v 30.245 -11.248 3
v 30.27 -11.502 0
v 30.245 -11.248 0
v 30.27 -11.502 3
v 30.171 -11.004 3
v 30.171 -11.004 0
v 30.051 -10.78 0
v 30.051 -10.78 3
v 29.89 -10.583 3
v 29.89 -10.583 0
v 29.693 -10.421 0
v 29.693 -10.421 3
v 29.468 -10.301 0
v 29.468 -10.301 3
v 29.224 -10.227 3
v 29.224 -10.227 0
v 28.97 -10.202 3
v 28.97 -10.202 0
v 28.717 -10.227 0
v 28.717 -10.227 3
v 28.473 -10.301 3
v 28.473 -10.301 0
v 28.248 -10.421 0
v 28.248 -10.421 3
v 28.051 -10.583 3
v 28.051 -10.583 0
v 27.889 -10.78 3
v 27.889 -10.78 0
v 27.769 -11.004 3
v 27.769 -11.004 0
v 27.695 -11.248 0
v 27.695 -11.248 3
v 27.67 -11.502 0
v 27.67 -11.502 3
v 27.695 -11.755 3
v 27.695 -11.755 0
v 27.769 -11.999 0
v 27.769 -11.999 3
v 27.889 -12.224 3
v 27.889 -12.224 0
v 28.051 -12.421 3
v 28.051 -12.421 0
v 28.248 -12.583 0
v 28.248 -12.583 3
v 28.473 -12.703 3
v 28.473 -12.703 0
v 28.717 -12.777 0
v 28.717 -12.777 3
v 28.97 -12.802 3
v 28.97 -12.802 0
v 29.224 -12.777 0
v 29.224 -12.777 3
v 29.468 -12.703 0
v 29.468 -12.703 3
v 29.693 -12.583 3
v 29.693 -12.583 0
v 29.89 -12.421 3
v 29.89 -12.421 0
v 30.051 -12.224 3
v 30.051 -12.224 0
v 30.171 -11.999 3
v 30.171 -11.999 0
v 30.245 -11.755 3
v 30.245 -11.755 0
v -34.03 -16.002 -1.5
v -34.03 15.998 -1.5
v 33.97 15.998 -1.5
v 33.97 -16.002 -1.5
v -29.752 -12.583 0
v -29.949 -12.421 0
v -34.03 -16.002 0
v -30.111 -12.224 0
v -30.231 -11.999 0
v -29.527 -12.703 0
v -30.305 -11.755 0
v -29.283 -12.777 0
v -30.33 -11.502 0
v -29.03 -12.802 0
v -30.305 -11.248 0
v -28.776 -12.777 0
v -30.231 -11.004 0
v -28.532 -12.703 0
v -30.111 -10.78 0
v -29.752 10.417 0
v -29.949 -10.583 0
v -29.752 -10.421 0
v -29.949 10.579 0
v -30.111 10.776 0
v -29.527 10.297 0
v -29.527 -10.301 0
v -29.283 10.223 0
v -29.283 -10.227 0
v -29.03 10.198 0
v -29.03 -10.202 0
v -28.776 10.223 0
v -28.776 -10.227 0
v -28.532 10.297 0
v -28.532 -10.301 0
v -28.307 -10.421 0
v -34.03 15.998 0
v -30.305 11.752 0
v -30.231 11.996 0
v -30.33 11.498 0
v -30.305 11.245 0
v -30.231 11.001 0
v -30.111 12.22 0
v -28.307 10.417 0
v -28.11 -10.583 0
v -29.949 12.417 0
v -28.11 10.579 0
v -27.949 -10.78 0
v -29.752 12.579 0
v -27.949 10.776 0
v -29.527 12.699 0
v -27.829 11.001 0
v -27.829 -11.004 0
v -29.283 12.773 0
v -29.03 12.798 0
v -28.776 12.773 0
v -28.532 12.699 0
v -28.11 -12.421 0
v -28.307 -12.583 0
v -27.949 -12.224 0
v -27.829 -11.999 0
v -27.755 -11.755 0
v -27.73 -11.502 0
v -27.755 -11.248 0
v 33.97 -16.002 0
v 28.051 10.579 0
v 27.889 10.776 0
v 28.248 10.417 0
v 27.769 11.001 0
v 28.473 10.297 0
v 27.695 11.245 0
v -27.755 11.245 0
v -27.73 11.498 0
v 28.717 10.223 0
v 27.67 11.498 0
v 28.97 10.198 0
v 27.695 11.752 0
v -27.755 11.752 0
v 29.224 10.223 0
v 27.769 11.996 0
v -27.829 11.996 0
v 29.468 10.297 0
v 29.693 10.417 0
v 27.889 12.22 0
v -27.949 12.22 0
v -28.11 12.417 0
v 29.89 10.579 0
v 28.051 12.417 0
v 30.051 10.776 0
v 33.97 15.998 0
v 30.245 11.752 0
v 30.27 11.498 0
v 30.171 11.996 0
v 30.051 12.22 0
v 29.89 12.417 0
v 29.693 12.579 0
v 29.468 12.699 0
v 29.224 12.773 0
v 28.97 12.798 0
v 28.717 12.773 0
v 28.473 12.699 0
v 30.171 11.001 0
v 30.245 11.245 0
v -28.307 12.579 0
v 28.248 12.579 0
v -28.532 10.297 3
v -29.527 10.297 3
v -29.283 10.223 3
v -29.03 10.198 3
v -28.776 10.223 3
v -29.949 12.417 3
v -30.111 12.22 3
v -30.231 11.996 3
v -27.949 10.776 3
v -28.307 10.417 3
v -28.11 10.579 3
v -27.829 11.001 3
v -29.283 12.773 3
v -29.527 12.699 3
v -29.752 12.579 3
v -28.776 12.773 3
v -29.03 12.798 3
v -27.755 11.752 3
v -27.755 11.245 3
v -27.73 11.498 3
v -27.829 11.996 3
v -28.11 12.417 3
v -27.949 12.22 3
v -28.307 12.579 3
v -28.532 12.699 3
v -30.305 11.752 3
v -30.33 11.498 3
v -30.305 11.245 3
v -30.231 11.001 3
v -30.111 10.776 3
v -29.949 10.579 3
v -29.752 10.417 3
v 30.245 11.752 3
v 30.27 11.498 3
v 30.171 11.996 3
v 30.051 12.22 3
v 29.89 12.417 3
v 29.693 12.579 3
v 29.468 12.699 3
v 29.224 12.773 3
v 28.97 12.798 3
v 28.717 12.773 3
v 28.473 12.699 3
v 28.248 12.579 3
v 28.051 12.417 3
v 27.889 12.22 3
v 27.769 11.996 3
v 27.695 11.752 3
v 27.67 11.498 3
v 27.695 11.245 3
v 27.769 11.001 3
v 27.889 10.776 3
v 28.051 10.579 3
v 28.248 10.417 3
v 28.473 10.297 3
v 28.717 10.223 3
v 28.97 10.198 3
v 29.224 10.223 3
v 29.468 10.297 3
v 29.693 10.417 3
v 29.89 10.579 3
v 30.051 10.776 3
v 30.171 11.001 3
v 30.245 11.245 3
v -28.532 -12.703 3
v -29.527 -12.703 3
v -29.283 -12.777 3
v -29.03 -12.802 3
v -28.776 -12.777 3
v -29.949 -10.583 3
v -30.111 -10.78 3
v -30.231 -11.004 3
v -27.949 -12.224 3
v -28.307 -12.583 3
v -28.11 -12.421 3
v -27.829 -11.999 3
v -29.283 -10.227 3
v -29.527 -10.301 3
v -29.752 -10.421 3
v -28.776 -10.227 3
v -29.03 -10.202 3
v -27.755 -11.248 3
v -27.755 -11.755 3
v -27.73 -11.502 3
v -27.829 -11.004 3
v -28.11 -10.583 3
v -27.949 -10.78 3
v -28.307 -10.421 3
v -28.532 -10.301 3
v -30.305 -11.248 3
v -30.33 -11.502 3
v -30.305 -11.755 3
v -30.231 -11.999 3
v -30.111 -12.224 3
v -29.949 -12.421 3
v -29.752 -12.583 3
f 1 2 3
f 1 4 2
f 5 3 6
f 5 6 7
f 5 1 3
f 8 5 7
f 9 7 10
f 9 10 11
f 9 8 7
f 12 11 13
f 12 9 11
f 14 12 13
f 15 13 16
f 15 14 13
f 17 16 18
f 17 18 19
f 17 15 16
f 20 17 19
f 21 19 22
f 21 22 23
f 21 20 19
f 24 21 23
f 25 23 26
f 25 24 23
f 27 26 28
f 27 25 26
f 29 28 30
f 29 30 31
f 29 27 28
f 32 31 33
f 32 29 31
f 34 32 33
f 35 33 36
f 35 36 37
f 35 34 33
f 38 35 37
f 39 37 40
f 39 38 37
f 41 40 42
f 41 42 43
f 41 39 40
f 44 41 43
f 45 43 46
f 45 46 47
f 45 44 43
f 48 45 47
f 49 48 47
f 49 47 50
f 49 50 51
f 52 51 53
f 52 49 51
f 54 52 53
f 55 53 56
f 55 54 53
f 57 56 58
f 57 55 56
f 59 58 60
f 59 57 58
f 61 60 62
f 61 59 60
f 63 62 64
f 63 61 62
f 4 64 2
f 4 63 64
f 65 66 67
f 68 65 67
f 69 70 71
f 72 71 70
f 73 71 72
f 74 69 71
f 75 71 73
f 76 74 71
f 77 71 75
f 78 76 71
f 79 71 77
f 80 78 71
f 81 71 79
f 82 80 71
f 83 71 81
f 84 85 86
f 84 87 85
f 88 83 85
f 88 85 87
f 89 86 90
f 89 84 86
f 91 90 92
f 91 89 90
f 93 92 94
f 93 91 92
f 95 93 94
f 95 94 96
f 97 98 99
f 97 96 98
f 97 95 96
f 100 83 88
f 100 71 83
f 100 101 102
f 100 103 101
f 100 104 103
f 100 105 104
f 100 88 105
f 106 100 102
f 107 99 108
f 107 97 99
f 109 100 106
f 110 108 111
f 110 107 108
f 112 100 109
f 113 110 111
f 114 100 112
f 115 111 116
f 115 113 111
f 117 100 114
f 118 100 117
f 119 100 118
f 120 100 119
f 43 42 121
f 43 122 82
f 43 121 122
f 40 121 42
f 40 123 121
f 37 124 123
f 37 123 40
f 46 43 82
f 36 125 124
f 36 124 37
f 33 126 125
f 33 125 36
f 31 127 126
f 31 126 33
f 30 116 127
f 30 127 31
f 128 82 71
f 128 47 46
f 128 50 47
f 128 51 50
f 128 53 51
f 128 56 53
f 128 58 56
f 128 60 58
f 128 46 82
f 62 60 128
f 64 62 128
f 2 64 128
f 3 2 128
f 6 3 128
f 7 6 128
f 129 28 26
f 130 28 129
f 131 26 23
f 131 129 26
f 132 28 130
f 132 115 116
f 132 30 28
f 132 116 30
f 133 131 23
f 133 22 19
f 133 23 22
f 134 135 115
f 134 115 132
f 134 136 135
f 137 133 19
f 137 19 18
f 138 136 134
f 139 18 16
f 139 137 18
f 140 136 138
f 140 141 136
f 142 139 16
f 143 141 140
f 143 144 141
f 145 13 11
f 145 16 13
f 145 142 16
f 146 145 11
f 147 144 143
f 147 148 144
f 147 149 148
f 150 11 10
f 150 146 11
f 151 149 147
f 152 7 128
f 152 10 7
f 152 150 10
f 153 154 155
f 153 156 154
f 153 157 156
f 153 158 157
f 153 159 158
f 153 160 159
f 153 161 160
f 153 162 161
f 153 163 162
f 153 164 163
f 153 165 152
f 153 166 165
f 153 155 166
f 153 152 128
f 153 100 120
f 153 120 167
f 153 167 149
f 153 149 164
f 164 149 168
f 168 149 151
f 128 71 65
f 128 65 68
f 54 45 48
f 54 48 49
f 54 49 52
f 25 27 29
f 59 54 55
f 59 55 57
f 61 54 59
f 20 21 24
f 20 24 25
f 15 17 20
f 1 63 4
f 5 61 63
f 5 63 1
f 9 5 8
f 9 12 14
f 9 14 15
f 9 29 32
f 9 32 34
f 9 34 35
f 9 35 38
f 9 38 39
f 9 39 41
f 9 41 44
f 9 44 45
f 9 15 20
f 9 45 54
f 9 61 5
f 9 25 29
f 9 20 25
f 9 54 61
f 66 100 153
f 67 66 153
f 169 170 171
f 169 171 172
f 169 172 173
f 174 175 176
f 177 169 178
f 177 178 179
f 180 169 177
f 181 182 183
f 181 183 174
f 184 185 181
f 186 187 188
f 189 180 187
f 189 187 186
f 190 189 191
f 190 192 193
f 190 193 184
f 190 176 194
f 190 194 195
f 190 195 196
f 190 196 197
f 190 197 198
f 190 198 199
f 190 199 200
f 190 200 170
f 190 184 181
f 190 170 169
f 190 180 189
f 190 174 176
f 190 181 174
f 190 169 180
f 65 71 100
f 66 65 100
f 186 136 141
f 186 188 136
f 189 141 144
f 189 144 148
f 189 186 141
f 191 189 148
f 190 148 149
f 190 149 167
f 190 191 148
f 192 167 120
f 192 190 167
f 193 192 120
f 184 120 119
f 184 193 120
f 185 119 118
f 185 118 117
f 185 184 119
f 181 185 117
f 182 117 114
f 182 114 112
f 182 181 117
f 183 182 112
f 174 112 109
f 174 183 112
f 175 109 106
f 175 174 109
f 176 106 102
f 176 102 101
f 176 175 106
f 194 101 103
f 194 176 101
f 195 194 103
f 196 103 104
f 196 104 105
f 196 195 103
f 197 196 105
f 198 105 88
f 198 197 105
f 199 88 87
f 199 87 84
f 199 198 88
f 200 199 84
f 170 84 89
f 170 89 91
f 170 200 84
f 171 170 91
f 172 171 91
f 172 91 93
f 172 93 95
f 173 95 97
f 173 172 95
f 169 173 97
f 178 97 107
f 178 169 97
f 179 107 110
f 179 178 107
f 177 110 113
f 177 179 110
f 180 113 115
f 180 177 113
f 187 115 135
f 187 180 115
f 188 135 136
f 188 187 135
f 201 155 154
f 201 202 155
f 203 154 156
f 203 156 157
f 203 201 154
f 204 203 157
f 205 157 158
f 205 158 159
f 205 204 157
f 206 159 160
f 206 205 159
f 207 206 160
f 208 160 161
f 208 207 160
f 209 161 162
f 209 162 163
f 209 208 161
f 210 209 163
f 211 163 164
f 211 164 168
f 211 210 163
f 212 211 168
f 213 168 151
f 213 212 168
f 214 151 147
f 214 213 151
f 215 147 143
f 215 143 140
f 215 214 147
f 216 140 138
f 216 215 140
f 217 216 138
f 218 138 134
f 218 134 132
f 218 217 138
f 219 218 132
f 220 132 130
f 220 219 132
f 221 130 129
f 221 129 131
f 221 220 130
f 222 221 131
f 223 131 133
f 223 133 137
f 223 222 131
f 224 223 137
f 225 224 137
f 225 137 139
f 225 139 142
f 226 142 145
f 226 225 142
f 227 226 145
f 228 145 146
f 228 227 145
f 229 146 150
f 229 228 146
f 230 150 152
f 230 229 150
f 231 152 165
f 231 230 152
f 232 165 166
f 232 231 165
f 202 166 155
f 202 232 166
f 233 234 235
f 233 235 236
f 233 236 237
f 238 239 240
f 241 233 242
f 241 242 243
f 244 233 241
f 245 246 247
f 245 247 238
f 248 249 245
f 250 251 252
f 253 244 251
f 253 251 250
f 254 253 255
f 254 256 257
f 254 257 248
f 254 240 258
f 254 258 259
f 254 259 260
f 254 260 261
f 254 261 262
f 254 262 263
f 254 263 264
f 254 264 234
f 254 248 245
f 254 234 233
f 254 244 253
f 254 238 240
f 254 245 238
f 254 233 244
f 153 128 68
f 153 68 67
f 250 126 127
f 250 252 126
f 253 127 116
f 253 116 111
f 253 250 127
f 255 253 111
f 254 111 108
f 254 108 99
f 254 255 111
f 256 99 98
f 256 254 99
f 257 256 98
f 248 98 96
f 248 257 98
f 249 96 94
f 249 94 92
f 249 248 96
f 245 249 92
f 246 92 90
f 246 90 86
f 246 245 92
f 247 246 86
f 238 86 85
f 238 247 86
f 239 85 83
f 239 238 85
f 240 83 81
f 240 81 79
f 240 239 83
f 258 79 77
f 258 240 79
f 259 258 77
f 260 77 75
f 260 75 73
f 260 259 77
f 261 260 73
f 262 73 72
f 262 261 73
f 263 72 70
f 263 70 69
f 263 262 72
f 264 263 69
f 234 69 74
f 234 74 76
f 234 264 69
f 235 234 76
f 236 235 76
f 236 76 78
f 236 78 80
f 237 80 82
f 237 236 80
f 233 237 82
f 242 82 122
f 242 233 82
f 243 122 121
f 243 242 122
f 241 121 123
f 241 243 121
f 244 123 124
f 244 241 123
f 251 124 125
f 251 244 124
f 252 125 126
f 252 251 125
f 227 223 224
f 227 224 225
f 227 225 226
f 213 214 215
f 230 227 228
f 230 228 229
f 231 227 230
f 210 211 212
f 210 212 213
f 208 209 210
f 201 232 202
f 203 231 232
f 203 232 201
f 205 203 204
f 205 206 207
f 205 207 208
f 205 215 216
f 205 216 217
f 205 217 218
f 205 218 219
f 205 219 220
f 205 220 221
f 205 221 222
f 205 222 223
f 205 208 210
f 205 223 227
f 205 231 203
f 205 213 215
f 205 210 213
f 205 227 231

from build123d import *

# Parameters (mm, degrees)
F0_R          = 1.3
F1_DEPTH      = 3
F1_DEPTH_BACK = 1.5
F0_W          = 68
F0_H          = 32
F2_DEPTH      = 1.5


with BuildPart() as f1:
    # F0 (on Top) → F1 (new body, two sides)
    with BuildSketch(Plane.XY) as f1_sk:
        with Locations((-29.0296536804, -11.5017628863)):
            Circle(F0_R)
    extrude(amount=F1_DEPTH)
    extrude(f1_sk.sketch, amount=-F1_DEPTH_BACK)



with BuildPart() as f1b:
    # F0 (on Top) → F1, piece 2 (new body, two sides)
    with BuildSketch(Plane.XY) as f1_2_sk:
        with Locations((-29.0296536804, 11.4982371137)):
            Circle(F0_R)
    extrude(amount=F1_DEPTH)
    extrude(f1_2_sk.sketch, amount=-F1_DEPTH_BACK)


with BuildPart() as f1c:
    # F0 (on Top) → F1, piece 3 (new body, two sides)
    with BuildSketch(Plane.XY) as f1_3_sk:
        with Locations((28.9703463196, 11.4982371137)):
            Circle(F0_R)
    extrude(amount=F1_DEPTH)
    extrude(f1_3_sk.sketch, amount=-F1_DEPTH_BACK)


with BuildPart() as f1d:
    # F0 (on Top) → F1, piece 4 (new body, two sides)
    with BuildSketch(Plane.XY) as f1_4_sk:
        with Locations((28.9703463196, -11.5017628863)):
            Circle(F0_R)
    extrude(amount=F1_DEPTH)
    extrude(f1_4_sk.sketch, amount=-F1_DEPTH_BACK)


with BuildPart() as f1_1:
    add(f1.part)

    add(f1b.part)  # F2 merges F1b

    add(f1c.part)  # F2 merges F1c

    add(f1d.part)  # F2 merges F1d
    # F0 (on Top) → F2 (join)
    with BuildSketch(Plane.XY):
        with Locations((-0.0296536804, -0.0017628863)):
            Rectangle(F0_W, F0_H)
        with Locations((-29.0296536804, -11.5017628863)):
            Circle(F0_R, mode=Mode.SUBTRACT)
        with Locations((28.9703463196, -11.5017628863)):
            Circle(F0_R, mode=Mode.SUBTRACT)
        with Locations((-29.0296536804, 11.4982371137)):
            Circle(F0_R, mode=Mode.SUBTRACT)
        with Locations((28.9703463196, 11.4982371137)):
            Circle(F0_R, mode=Mode.SUBTRACT)
    extrude(amount=-F2_DEPTH)


solid = f1_1.part
